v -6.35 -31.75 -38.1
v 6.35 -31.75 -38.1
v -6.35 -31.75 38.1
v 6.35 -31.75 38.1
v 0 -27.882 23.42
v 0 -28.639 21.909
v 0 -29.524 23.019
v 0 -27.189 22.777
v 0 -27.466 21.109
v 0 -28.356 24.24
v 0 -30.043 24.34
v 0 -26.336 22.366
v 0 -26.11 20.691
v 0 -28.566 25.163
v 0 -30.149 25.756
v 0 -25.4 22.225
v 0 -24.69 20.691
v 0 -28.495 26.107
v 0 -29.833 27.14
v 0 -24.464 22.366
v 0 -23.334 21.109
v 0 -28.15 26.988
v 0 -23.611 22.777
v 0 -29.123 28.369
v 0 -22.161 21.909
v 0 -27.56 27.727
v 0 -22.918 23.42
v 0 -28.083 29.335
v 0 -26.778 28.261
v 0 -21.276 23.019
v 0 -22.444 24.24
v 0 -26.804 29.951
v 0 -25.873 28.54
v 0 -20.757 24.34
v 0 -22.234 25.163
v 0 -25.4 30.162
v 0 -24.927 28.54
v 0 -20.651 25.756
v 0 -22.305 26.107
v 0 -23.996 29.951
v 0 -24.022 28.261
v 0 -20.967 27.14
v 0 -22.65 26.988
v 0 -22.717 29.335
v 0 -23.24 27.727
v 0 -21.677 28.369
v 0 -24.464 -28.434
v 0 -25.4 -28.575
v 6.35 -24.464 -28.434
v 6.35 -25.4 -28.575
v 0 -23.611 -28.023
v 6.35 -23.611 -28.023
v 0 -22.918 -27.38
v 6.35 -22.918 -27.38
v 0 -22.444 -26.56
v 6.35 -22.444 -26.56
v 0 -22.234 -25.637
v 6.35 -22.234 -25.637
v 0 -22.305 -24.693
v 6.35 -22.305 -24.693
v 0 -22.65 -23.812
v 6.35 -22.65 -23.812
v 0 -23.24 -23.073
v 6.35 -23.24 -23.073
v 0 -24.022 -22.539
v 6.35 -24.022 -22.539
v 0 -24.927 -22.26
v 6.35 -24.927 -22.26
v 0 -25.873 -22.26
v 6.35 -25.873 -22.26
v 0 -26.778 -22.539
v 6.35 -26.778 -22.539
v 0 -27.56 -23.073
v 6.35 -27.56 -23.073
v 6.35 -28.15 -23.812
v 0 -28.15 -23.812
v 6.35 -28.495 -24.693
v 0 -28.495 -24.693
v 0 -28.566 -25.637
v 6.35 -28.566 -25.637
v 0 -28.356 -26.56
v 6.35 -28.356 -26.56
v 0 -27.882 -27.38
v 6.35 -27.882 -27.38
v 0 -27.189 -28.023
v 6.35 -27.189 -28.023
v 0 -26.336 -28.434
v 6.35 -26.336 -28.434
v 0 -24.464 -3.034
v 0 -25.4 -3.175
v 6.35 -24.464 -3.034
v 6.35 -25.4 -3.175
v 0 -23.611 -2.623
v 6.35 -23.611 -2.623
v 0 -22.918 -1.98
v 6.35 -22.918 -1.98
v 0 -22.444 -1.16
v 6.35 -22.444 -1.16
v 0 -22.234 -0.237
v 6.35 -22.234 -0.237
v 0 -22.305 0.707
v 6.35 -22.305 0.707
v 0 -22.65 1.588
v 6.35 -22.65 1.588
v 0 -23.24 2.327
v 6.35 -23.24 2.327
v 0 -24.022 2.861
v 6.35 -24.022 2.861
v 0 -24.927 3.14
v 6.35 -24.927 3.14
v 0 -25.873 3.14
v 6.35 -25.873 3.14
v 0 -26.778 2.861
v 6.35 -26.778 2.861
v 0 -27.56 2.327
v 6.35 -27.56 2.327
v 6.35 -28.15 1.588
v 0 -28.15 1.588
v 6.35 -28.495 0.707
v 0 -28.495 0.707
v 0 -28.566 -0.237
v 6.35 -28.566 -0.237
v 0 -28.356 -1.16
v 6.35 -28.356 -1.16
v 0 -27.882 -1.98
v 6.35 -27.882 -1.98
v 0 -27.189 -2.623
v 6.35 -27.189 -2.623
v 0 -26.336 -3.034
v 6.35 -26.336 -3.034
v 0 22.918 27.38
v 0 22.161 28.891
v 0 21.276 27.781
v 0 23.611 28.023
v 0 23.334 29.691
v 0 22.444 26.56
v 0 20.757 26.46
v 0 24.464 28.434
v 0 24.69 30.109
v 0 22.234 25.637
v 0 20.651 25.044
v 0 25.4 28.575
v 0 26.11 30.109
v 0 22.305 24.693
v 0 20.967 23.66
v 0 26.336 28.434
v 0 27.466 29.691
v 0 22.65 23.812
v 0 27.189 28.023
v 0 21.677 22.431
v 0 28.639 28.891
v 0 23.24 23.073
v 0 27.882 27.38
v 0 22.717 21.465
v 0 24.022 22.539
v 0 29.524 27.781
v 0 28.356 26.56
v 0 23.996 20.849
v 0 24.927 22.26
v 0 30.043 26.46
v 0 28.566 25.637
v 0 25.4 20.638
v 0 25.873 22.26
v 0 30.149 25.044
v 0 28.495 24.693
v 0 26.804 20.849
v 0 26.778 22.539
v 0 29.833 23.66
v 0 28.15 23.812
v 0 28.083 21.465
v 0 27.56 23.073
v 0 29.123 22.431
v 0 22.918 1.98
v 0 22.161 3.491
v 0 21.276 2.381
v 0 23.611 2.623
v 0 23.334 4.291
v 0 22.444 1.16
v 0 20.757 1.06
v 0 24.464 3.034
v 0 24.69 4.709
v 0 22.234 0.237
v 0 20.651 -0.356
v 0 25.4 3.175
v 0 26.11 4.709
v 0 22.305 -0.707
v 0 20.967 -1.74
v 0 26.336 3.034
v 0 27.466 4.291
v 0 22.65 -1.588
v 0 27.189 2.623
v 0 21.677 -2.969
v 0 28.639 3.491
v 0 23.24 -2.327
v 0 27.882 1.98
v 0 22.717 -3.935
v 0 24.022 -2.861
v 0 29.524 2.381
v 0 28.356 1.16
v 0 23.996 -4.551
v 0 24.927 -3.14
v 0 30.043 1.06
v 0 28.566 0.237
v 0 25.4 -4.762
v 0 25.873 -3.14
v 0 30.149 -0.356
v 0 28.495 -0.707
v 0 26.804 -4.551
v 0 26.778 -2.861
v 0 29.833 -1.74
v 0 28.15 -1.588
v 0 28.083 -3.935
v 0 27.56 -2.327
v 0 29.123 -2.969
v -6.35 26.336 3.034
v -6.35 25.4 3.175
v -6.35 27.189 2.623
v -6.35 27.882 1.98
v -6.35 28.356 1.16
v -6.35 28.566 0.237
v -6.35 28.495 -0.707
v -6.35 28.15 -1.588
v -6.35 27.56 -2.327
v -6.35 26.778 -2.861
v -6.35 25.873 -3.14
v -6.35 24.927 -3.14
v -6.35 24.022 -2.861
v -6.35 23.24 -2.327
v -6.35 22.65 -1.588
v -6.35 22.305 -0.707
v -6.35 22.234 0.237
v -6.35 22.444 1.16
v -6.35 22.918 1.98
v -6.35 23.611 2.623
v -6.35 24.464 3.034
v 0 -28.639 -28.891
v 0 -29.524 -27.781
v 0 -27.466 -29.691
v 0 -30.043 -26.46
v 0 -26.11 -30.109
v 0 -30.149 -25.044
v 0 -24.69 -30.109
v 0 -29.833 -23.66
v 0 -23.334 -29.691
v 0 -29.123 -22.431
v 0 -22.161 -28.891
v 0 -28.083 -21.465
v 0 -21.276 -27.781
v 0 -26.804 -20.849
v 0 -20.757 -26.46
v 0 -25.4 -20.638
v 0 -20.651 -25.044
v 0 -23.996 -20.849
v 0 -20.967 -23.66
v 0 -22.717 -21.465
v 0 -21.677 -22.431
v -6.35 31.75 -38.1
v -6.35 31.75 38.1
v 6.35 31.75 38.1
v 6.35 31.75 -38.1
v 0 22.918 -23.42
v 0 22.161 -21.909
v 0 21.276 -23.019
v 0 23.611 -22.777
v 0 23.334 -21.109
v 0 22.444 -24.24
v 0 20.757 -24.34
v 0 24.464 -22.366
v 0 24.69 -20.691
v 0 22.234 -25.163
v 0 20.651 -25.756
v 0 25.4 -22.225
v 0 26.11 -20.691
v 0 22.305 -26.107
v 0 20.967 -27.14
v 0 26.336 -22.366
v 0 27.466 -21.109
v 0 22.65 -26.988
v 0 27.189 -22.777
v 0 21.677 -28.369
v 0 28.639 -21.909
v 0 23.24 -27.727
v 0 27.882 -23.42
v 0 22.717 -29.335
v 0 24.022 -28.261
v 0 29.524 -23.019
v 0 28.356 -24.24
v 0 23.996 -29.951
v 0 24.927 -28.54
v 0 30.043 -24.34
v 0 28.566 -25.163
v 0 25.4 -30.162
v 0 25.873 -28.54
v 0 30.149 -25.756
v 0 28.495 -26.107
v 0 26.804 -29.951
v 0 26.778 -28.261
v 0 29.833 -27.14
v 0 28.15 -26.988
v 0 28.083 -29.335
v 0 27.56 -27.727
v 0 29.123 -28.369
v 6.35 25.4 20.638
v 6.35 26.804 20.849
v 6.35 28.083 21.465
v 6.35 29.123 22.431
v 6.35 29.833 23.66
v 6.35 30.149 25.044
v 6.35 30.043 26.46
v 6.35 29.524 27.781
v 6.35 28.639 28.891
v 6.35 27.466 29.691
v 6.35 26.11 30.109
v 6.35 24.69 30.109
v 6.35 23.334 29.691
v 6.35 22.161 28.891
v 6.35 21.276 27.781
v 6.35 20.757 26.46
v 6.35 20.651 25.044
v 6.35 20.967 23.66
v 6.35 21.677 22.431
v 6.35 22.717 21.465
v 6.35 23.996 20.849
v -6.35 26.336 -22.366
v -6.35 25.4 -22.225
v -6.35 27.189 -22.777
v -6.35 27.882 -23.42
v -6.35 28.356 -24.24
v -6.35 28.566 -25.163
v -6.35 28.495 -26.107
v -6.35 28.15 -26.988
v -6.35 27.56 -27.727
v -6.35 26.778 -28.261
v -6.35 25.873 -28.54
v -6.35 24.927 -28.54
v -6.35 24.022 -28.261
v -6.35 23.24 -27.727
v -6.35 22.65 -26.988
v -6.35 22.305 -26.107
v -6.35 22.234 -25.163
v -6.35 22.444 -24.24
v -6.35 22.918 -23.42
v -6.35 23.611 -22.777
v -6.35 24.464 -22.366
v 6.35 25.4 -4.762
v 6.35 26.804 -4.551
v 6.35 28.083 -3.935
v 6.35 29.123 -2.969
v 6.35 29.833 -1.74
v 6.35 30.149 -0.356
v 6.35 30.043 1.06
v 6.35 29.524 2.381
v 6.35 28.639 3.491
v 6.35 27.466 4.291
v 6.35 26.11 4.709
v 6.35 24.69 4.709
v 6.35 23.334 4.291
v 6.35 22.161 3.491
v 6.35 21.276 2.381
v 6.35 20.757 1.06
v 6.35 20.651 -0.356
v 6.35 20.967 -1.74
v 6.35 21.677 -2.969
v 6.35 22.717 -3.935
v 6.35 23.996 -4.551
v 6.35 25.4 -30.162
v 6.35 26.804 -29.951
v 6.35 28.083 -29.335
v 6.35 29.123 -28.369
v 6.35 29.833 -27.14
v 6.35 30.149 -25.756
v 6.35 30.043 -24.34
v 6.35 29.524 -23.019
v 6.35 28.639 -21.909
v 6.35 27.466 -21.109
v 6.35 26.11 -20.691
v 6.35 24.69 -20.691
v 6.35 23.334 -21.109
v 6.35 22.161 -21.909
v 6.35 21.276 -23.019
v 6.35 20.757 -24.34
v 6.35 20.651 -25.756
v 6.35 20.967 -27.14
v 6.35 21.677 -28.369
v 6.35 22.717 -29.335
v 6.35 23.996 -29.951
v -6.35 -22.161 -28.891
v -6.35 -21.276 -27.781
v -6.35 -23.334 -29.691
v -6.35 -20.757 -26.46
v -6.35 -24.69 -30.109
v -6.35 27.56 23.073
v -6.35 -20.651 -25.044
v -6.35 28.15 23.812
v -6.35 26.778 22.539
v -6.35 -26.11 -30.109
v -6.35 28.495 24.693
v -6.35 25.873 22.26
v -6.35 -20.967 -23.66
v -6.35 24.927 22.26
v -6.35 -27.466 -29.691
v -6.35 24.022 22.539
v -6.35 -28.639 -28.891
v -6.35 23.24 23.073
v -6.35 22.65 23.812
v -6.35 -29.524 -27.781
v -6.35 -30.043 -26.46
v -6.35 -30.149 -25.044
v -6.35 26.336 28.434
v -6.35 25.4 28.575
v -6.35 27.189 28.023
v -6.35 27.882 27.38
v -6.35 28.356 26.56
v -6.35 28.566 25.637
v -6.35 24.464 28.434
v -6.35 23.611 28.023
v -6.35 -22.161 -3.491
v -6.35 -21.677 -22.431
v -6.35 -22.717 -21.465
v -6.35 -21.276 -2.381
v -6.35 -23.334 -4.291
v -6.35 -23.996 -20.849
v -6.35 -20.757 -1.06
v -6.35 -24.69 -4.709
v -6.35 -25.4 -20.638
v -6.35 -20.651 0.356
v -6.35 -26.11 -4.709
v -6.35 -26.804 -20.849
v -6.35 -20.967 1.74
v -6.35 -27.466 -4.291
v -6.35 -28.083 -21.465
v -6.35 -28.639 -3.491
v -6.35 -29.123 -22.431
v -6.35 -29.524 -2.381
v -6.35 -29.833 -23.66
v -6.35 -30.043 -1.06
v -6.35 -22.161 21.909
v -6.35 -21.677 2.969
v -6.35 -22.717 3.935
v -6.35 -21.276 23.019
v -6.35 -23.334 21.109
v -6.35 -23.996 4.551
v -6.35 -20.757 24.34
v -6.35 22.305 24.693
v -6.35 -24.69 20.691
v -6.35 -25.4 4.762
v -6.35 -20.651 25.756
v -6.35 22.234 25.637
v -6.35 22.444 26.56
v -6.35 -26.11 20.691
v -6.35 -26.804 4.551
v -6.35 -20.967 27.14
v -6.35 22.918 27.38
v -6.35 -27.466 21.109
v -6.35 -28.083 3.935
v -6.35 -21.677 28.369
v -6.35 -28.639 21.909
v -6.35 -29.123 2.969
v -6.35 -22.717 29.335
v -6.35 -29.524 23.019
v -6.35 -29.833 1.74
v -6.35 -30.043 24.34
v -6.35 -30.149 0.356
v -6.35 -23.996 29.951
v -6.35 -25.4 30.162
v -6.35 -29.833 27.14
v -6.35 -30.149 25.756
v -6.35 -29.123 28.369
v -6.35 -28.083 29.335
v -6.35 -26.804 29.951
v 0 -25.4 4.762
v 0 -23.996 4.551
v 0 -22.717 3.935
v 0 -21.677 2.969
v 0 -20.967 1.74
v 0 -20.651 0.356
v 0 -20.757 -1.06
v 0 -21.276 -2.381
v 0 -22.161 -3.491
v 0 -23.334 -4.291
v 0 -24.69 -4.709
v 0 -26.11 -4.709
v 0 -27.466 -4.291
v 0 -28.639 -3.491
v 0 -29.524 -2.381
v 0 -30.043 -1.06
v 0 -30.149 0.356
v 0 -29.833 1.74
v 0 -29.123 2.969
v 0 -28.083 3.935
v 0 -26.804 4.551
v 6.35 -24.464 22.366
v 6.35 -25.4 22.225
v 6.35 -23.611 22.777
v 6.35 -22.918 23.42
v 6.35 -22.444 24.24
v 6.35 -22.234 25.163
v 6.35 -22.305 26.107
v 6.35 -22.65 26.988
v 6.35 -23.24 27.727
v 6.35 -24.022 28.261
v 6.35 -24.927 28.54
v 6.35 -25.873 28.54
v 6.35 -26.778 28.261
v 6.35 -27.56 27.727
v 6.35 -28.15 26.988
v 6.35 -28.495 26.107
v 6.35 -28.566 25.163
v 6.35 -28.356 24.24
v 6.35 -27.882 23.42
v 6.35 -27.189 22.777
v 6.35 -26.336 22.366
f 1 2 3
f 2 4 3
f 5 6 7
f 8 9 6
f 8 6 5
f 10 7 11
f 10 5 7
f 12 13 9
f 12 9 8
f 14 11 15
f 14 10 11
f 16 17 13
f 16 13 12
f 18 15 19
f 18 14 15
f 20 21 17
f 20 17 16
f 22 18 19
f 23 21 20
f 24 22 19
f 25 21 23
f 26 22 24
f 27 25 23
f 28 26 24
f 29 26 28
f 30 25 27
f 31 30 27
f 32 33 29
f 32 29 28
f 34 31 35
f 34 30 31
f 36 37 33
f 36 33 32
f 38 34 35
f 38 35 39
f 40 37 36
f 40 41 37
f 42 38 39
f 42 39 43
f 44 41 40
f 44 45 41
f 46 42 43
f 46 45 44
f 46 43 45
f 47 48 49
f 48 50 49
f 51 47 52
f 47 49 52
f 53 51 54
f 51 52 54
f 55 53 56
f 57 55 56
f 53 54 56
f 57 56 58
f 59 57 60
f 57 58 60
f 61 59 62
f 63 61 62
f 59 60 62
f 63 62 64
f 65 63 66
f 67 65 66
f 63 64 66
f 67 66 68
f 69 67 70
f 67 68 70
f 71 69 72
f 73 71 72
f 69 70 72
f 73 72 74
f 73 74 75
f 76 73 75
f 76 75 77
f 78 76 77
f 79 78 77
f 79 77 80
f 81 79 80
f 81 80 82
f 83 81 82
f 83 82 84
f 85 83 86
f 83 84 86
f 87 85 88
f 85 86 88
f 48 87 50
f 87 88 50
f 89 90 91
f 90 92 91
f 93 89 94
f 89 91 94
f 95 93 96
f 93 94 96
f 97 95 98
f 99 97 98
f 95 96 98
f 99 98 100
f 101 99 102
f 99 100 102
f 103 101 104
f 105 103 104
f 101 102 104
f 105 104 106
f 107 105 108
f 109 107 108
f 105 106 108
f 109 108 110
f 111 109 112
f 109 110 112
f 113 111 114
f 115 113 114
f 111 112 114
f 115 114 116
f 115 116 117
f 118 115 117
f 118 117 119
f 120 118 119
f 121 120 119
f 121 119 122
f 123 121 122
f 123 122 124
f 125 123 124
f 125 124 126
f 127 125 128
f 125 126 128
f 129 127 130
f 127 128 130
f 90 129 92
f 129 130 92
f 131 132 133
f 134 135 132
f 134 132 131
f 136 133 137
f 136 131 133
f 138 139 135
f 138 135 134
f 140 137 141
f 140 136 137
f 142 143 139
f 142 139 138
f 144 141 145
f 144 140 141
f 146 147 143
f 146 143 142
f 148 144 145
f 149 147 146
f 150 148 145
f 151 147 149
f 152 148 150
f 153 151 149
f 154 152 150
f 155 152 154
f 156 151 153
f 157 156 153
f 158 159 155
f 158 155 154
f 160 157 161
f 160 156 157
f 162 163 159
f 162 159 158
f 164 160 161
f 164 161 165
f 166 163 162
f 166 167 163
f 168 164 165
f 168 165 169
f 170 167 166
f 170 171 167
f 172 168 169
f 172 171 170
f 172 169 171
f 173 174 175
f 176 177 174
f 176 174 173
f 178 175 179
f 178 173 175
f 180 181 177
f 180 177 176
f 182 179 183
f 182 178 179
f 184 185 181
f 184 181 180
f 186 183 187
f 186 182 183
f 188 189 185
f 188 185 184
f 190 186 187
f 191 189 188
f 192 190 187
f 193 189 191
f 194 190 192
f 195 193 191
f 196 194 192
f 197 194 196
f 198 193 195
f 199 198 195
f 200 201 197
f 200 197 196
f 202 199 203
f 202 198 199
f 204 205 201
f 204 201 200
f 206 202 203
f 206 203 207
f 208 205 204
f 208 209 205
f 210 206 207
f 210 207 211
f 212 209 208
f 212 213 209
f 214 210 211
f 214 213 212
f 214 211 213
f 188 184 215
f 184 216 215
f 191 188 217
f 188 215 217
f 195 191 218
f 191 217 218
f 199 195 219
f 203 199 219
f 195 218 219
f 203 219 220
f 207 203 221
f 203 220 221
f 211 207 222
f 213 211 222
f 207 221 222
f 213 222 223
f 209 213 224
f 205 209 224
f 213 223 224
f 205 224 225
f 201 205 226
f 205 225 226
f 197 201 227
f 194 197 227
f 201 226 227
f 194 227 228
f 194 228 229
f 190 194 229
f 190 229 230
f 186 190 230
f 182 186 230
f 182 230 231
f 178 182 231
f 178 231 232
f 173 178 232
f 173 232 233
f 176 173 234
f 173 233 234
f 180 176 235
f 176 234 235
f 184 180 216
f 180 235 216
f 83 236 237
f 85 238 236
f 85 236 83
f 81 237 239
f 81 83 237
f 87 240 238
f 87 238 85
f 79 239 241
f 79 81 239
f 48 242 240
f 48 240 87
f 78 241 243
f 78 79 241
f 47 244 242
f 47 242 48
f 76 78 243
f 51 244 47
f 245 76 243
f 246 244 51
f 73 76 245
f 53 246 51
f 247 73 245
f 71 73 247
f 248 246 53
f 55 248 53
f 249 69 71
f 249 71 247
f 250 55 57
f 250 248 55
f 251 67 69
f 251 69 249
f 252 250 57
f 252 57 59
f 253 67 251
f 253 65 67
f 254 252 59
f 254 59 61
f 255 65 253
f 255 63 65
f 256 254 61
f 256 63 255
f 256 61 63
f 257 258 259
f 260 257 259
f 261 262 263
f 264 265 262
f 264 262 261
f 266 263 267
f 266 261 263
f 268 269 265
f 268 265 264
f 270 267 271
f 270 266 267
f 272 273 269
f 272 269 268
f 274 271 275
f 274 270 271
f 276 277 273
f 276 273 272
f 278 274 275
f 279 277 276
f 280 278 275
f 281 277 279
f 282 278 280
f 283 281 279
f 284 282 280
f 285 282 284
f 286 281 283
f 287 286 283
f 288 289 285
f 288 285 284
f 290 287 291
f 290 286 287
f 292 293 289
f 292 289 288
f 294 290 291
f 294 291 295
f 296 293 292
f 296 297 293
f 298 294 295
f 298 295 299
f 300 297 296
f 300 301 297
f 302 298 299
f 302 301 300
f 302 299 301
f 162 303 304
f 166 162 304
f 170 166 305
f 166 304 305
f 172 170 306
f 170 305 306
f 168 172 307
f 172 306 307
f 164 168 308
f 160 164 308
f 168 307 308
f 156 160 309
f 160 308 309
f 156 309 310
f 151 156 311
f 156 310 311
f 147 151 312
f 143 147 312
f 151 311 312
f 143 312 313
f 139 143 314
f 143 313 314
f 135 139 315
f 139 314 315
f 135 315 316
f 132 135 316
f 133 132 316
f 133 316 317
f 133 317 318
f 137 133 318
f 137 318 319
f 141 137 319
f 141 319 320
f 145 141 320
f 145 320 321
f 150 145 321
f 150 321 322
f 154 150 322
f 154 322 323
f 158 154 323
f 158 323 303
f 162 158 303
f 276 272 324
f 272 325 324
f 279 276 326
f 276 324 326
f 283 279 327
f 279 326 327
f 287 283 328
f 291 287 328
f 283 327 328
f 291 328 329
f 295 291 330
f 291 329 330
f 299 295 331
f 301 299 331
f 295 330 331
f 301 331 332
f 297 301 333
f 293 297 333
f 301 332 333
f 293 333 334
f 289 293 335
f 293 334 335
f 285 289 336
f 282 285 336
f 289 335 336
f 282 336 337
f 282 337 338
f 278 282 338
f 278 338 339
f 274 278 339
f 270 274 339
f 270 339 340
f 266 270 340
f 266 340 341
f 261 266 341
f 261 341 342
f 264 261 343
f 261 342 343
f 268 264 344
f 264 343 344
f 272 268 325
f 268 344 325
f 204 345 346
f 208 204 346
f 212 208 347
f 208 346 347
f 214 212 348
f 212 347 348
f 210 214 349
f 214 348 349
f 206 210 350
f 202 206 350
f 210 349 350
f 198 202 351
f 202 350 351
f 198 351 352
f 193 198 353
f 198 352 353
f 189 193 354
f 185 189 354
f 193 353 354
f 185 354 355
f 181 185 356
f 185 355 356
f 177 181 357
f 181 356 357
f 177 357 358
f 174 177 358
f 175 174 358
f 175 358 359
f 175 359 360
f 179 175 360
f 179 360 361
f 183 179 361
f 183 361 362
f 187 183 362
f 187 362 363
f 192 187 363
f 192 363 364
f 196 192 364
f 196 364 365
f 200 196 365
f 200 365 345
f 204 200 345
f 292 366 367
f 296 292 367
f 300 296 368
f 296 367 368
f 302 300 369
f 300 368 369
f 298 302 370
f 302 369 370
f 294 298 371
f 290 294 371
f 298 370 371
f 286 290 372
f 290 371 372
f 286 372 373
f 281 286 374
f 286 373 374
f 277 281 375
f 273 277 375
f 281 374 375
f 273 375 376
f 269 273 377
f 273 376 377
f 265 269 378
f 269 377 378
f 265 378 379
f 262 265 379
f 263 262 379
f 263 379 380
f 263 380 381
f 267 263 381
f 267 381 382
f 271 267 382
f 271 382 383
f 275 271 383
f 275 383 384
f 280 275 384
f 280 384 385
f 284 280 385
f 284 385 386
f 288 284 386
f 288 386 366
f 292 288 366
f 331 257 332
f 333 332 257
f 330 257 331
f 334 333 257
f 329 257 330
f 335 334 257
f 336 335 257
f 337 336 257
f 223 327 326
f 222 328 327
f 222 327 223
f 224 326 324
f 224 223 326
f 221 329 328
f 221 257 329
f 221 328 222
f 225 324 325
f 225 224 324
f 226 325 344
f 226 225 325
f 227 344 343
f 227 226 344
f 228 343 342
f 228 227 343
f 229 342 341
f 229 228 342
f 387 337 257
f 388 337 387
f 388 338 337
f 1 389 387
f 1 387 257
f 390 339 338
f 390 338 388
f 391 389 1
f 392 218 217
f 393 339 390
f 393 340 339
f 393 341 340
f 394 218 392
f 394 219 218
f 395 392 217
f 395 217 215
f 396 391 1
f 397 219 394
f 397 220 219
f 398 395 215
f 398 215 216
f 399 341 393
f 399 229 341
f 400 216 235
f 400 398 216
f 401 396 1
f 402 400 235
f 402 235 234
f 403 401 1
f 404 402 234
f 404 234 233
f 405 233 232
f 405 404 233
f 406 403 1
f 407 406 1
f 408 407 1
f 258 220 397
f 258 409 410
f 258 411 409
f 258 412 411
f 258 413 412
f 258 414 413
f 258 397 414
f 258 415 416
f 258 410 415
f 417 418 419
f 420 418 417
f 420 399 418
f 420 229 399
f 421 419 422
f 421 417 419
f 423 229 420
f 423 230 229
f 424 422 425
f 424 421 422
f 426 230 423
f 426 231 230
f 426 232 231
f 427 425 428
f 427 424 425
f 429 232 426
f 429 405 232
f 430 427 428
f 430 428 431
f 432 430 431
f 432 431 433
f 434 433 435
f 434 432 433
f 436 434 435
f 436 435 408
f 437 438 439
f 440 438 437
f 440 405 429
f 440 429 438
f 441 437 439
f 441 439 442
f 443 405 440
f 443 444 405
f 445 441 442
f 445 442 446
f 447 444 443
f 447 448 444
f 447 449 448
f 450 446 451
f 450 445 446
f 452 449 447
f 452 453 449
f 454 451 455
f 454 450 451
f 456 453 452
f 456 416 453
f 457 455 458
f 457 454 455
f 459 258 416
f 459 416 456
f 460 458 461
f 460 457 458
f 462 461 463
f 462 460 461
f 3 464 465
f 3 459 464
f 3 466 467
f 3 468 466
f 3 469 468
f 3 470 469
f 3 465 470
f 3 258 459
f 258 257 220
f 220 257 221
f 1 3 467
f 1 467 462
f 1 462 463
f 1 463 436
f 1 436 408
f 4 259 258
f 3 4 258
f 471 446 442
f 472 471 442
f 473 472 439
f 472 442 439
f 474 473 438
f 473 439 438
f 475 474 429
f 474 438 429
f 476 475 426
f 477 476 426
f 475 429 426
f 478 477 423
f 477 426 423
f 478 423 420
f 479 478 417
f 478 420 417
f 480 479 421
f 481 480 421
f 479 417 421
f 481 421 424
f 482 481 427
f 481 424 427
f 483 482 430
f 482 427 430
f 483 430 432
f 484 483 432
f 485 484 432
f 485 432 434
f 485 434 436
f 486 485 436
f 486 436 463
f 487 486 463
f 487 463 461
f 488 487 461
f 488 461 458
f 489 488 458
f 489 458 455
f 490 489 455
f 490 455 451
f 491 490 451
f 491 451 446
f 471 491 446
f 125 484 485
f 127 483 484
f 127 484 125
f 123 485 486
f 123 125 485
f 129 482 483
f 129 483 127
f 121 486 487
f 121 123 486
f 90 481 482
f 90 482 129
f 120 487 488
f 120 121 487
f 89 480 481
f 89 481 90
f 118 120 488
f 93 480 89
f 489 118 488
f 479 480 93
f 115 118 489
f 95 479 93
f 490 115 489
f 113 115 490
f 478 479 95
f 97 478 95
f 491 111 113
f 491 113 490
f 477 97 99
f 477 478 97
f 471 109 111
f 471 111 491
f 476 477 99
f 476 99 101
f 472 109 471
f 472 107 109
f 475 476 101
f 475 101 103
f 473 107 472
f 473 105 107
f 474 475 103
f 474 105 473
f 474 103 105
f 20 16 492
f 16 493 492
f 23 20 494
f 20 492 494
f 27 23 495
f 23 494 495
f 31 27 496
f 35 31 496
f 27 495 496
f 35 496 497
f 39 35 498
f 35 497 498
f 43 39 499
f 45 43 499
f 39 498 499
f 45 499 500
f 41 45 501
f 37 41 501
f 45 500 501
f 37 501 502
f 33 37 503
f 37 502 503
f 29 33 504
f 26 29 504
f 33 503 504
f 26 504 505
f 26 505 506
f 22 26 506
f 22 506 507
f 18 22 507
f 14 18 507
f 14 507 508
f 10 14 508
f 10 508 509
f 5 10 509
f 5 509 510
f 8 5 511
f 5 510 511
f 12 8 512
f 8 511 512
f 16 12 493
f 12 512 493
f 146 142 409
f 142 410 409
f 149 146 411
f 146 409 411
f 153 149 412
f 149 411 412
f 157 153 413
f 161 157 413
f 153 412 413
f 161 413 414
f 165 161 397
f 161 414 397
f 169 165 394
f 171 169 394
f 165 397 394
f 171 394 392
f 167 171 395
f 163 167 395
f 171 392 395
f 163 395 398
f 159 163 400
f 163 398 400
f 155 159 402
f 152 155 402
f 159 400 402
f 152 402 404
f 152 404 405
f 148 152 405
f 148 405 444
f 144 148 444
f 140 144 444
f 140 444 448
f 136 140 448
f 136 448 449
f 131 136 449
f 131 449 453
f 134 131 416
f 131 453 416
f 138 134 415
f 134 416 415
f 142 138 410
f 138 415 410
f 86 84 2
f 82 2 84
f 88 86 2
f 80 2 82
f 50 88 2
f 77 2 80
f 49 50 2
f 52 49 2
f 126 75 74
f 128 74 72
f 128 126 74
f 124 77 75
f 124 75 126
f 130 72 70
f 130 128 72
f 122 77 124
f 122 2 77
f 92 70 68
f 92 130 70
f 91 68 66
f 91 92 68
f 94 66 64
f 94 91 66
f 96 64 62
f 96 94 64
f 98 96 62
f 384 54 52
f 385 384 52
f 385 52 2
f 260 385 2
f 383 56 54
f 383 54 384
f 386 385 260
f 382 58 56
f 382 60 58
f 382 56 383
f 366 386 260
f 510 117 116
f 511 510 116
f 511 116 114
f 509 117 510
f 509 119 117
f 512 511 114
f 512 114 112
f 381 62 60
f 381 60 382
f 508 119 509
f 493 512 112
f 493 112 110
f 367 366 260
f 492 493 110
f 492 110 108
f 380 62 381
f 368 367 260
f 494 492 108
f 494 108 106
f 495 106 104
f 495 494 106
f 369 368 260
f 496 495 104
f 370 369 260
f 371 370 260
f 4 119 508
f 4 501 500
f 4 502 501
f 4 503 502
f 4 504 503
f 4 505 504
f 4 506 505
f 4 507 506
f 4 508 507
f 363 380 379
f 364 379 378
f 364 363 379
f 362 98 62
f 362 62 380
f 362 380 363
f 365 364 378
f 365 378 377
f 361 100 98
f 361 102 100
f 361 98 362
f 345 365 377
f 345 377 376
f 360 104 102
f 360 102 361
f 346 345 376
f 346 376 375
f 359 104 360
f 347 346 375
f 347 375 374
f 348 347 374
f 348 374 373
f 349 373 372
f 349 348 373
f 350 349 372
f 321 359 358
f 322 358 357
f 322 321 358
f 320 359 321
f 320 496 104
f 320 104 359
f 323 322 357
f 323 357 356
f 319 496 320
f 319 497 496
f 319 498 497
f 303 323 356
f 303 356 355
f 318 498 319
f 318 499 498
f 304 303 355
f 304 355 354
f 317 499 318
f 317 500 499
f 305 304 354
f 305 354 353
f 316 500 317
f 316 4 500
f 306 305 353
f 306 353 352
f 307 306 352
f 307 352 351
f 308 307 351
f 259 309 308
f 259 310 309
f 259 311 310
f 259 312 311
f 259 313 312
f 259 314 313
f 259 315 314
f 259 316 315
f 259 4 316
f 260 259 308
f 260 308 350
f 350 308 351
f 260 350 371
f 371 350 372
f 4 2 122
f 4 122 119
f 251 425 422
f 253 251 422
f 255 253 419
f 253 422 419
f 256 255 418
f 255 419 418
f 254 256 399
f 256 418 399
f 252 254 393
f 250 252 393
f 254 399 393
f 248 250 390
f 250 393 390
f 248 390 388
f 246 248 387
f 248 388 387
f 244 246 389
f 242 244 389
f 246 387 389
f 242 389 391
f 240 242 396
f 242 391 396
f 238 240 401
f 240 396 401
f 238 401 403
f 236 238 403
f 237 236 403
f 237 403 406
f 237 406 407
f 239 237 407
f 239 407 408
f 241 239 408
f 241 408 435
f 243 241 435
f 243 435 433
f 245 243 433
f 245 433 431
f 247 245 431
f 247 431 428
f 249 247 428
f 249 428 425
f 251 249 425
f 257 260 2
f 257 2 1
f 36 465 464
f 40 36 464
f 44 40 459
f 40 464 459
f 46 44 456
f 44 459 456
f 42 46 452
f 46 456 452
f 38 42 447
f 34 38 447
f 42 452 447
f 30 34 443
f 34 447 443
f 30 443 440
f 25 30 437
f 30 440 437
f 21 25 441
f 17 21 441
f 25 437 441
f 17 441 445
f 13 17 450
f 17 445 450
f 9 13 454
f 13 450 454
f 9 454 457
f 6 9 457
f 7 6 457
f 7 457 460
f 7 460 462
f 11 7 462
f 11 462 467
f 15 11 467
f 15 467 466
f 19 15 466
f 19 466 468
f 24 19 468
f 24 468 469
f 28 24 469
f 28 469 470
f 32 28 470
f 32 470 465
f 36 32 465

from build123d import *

# Parameters (mm, degrees)
BOSS_EXTRUDE1_DEPTH                           = 38.1
F_1_4_20_THREADED_C_BORE_D                    = 6.35
F_1_4_20_THREADED_C_BORE_CBORE_D              = 9.525
F_1_4_20_THREADED_C_BORE_CBORE_DEPTH          = 6.35
F_1_4_20_THREADED_C_BORE_OPPOSITE_D           = 6.35
F_1_4_20_THREADED_C_BORE_OPPOSITE_CBORE_D     = 9.525
F_1_4_20_THREADED_C_BORE_OPPOSITE_CBORE_DEPTH = 6.35


with BuildPart() as part:
    # Sketch2 → Boss-Extrude1 (new, symmetric)
    with BuildSketch(Plane.XY):
        Polygon((-6.35, 31.75), (6.35, 31.75), (6.35, -19.05), (6.35, -31.75), (-6.35, -31.75), (-6.35, 19.05), align=None)
    extrude(amount=BOSS_EXTRUDE1_DEPTH, both=True)

    # 1/4"-20 threaded c-bore (through all)
    with Locations(Plane.ZY.offset(6.35)):
        with Locations((-25.4, -25.4), (0, -25.4), (25.4, -25.4)):
            CounterBoreHole(F_1_4_20_THREADED_C_BORE_D / 2, F_1_4_20_THREADED_C_BORE_CBORE_D / 2, F_1_4_20_THREADED_C_BORE_CBORE_DEPTH)

    # 1/4"-20 threaded c-bore opposite (through all)
    with Locations(Plane(origin=(6.35, 0, 0), x_dir=(0, 0, -1), z_dir=(1, 0, 0))):
        with Locations((-25.4, 25.4), (0, 25.4), (25.4, 25.4)):
            CounterBoreHole(F_1_4_20_THREADED_C_BORE_OPPOSITE_D / 2, F_1_4_20_THREADED_C_BORE_OPPOSITE_CBORE_D / 2, F_1_4_20_THREADED_C_BORE_OPPOSITE_CBORE_DEPTH)


solid = part.part
